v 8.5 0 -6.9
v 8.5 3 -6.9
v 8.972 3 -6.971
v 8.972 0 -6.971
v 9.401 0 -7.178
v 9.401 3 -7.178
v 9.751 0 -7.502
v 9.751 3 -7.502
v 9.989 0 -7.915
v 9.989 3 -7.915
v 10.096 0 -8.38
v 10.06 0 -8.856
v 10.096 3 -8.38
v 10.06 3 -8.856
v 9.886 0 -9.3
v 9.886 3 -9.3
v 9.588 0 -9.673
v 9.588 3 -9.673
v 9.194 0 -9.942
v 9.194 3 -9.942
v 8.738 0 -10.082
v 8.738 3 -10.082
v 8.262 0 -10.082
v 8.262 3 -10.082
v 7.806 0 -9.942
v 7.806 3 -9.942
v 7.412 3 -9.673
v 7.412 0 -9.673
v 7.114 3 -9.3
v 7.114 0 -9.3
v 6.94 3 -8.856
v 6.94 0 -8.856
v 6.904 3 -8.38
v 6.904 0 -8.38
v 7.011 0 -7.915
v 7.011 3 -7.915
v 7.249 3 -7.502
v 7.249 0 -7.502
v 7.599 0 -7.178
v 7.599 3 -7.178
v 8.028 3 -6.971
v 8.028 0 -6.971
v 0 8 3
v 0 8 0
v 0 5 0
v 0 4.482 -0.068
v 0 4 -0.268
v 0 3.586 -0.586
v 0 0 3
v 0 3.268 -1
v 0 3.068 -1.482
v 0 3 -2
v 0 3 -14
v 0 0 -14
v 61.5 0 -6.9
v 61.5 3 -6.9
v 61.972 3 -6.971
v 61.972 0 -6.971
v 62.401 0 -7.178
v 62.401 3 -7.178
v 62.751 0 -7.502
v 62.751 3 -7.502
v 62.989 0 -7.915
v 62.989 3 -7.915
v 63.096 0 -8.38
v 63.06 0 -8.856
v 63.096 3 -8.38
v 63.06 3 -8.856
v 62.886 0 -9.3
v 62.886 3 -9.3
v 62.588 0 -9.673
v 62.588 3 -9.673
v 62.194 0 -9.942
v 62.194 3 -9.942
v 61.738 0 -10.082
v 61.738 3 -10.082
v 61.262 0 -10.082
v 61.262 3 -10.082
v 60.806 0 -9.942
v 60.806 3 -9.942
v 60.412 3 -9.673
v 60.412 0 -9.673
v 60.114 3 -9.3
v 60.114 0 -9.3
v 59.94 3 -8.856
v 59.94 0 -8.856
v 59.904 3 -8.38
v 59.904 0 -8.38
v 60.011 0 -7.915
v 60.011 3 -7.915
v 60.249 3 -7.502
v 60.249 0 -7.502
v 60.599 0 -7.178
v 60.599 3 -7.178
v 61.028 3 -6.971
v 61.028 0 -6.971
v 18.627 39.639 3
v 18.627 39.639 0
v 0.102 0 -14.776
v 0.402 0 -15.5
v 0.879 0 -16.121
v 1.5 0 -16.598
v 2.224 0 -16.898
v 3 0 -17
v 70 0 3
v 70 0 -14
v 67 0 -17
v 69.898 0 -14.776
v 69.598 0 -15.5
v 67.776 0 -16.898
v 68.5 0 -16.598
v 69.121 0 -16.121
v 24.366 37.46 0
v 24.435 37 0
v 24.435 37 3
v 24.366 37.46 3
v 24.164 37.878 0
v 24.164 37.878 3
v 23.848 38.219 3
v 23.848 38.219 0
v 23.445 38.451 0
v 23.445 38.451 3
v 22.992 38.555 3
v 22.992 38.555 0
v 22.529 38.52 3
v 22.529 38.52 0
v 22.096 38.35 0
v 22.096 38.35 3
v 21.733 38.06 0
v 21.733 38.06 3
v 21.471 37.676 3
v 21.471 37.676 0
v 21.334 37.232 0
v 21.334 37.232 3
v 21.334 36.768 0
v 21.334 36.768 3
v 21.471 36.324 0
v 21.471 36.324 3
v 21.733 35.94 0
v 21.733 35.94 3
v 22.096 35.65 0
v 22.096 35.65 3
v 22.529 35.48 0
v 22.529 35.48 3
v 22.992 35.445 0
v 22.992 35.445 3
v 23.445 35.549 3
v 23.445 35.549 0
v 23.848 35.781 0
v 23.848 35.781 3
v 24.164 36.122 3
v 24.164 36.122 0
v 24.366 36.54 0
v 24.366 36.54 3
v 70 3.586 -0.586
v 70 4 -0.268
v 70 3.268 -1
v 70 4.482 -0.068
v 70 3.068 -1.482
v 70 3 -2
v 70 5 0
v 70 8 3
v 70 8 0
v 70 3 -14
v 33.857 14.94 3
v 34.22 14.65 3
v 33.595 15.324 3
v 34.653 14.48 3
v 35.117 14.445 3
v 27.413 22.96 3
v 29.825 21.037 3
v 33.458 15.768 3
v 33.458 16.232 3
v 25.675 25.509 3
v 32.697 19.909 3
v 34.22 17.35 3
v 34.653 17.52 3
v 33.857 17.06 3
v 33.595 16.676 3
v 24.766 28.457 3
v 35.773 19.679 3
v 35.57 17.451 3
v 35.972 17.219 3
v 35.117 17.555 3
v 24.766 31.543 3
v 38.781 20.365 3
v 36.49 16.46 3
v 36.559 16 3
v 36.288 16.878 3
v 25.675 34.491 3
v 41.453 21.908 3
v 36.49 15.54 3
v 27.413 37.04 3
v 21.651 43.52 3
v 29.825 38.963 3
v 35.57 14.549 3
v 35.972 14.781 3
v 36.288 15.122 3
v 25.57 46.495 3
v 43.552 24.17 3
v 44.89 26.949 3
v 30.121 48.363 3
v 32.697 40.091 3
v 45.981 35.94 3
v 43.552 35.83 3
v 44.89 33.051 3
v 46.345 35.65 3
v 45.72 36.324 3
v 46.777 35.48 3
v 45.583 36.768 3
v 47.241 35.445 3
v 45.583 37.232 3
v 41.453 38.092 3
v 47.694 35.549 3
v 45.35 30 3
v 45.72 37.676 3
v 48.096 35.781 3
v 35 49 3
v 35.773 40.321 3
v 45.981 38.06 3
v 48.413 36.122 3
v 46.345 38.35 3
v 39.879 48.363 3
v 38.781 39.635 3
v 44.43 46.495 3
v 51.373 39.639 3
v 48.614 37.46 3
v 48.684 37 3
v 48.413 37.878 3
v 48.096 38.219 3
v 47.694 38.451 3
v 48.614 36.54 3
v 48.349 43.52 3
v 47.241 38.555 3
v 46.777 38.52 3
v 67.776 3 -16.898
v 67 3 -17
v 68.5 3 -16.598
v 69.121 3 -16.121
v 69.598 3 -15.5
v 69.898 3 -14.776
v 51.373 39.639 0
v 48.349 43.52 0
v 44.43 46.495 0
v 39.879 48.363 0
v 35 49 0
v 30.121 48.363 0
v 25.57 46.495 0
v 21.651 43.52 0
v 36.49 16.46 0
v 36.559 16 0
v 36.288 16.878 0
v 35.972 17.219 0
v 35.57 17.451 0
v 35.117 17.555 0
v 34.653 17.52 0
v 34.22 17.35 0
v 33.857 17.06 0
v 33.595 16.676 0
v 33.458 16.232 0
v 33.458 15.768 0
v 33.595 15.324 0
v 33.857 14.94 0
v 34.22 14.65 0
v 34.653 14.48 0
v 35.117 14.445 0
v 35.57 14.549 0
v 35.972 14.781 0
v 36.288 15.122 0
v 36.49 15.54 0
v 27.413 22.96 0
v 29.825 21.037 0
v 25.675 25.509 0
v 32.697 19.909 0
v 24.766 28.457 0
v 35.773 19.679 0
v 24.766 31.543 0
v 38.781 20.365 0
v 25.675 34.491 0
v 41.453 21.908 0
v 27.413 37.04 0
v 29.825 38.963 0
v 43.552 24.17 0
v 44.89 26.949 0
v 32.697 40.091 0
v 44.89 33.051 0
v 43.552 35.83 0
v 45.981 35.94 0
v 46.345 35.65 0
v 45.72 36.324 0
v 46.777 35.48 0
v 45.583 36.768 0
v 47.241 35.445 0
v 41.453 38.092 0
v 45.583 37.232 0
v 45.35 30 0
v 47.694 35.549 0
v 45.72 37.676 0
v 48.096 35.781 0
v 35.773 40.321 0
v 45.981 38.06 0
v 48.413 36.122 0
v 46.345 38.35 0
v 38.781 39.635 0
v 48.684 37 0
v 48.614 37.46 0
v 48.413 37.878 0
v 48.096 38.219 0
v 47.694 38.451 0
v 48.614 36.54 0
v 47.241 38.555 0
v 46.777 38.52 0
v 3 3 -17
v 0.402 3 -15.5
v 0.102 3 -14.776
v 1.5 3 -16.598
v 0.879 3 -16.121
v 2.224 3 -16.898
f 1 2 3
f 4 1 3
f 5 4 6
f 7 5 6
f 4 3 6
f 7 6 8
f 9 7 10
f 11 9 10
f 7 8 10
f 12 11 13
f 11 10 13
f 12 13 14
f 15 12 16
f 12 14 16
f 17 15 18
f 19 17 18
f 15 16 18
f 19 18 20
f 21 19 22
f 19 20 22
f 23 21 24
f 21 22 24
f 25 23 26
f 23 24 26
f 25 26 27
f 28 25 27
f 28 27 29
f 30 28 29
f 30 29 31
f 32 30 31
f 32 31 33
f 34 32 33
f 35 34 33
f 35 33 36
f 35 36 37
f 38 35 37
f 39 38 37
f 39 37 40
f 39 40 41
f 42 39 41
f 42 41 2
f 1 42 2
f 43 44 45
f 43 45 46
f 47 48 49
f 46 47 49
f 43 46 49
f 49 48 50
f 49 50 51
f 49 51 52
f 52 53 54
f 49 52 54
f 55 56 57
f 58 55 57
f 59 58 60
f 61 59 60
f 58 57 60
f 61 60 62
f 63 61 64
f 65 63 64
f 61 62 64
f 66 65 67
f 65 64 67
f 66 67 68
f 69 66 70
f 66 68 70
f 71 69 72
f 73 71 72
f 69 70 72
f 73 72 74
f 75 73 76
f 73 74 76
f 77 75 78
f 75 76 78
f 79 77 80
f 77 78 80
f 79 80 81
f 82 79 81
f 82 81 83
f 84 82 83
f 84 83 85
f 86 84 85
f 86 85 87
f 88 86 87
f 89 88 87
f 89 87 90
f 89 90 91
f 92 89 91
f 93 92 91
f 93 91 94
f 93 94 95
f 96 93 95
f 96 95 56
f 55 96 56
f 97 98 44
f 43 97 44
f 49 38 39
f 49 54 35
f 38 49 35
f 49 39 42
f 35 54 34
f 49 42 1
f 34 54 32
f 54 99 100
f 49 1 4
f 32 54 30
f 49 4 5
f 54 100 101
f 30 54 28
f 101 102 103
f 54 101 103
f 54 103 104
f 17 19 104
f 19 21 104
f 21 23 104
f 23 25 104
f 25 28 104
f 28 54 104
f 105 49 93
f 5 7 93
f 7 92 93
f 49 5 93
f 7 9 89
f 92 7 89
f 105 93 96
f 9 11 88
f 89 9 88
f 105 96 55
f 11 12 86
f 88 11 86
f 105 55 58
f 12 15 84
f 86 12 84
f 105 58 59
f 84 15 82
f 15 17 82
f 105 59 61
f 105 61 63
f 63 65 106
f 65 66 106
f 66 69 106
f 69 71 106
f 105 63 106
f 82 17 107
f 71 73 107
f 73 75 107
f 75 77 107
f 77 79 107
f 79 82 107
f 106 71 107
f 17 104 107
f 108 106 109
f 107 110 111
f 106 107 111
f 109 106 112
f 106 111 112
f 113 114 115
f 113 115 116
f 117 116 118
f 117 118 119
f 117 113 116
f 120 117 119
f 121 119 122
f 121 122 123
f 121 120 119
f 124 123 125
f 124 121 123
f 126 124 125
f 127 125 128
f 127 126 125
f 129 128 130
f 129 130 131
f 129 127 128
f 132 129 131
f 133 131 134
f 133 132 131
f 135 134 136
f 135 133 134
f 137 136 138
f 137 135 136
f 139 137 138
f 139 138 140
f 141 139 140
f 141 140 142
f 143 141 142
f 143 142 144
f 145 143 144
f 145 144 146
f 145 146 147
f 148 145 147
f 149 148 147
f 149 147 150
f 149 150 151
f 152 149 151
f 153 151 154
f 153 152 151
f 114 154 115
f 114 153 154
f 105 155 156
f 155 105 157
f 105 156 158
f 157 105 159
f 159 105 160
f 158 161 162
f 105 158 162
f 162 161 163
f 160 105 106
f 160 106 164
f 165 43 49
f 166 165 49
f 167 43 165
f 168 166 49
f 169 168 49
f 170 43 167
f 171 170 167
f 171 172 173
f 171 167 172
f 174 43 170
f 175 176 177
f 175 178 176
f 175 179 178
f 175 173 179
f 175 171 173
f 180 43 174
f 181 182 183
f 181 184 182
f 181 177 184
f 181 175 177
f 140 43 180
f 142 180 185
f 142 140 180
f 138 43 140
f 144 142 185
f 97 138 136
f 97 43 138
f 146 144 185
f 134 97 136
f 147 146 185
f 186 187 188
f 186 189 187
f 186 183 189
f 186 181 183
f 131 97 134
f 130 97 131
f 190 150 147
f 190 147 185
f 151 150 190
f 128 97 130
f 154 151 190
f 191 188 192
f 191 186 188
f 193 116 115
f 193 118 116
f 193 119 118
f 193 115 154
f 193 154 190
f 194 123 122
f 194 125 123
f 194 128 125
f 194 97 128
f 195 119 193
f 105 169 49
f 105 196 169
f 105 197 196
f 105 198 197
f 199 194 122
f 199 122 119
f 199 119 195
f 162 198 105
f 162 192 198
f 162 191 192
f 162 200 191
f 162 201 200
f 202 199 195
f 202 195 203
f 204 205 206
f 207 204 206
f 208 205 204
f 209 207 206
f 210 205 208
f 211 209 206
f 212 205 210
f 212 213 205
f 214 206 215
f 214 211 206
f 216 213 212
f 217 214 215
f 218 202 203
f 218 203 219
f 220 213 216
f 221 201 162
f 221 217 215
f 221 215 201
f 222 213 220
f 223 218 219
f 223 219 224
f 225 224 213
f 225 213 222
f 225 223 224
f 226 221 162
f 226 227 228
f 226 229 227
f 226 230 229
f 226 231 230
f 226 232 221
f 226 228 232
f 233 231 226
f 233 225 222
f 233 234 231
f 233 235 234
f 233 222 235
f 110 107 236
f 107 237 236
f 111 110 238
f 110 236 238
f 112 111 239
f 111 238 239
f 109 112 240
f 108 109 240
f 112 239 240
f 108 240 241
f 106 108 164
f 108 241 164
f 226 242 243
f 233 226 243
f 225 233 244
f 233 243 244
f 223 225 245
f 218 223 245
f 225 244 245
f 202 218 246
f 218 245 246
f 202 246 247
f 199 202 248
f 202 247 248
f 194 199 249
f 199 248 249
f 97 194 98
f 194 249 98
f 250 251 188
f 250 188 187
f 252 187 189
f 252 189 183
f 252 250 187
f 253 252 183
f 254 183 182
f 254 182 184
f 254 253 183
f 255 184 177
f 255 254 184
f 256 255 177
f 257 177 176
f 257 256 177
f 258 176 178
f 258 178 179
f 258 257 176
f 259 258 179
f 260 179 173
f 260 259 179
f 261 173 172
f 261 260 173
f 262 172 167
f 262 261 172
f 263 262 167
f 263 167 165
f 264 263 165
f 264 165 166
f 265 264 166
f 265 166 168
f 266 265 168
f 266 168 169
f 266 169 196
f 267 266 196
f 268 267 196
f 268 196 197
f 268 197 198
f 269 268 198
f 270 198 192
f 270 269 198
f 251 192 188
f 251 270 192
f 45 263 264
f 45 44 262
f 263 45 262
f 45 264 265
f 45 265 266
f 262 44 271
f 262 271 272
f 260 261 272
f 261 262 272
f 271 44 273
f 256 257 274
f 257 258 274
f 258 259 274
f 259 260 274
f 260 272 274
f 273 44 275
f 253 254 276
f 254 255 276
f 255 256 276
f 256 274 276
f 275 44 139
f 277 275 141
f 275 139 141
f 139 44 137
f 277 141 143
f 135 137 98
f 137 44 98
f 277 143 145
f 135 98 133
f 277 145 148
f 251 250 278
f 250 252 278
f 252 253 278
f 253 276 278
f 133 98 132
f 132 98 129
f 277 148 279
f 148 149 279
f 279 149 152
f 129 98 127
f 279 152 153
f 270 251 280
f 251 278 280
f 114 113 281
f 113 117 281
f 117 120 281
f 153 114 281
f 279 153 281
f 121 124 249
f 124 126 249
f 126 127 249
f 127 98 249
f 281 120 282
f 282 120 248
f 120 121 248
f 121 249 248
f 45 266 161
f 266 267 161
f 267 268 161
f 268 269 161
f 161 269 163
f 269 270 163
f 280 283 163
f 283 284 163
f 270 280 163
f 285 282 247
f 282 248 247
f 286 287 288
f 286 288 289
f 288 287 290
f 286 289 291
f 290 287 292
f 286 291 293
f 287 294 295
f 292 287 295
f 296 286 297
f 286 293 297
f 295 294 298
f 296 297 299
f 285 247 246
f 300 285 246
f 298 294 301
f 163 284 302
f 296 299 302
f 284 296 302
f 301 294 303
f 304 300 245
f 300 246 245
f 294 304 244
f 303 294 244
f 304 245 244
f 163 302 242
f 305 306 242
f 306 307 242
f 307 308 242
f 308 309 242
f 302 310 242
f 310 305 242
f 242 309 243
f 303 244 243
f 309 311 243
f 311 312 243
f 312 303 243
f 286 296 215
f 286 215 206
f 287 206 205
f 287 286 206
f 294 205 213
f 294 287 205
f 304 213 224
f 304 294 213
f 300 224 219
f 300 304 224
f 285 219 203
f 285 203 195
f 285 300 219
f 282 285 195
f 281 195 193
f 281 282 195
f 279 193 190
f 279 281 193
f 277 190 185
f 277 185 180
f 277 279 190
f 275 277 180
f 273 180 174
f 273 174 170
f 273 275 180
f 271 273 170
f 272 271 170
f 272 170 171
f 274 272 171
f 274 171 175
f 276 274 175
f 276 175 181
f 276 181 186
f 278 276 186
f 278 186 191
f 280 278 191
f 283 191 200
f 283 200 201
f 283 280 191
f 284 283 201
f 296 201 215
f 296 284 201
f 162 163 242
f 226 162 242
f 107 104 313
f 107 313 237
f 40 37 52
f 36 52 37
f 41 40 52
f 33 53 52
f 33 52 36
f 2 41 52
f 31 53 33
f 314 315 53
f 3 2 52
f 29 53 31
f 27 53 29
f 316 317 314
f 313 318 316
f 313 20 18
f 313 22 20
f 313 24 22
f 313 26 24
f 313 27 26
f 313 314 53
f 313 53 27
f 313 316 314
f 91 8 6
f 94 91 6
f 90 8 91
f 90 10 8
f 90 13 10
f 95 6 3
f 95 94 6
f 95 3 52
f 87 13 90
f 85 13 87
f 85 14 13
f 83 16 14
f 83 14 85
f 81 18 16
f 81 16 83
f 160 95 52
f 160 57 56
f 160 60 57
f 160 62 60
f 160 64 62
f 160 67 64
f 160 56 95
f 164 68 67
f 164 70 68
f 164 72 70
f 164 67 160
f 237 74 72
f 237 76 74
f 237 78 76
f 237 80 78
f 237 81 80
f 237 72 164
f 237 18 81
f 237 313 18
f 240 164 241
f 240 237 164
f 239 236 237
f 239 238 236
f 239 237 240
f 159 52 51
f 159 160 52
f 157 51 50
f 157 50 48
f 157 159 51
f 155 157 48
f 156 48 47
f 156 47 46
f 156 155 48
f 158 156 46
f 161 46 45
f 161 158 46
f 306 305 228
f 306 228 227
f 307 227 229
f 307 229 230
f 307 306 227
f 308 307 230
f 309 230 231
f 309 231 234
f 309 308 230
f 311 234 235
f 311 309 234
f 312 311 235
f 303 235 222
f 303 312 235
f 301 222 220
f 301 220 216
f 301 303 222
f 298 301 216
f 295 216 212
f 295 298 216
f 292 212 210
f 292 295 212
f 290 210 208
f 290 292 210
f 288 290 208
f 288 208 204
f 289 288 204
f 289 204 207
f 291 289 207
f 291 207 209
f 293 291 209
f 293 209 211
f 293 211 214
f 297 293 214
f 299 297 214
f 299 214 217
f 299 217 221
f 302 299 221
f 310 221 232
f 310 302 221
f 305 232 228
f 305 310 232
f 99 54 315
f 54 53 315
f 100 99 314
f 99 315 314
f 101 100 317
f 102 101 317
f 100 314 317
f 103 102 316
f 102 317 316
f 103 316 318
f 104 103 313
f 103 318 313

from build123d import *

# Parameters (mm, degrees)
SKETCH1_W           = 70
SKETCH1_H           = 17
BOSS_EXTRUDE1_DEPTH = 3
SKETCH2_R           = 10.35
SKETCH2_R_2         = 1.559144978
BOSS_EXTRUDE2_DEPTH = 3
SKETCH3_R           = 1.6
CUT_EXTRUDE1_DEPTH  = 4
FILLET1_R           = 3
FILLET2_R           = 2


with BuildPart() as part:
    # Sketch1 → Boss-Extrude1 (new body)
    with BuildSketch(Plane(origin=(0, 0, 0), x_dir=(1, 0, 0), z_dir=(0, 1, 0))):
        with Locations((35, 8.5)):
            Rectangle(SKETCH1_W, SKETCH1_H)
    extrude(amount=BOSS_EXTRUDE1_DEPTH)

    # Sketch2 → Boss-Extrude2 (add)
    with BuildSketch(Plane.XY):
        with BuildLine():
            Line((0, 0), (70, 0))
            Line((70, 0), (70, 8))
            Line((70, 8), (51.37327089, 39.639294598))
            ThreePointArc((51.37327089, 39.639294598), (35, 49), (18.62672911, 39.639294598))
            Line((18.62672911, 39.639294598), (0, 8))
            Line((0, 8), (0, 0))
        make_face()
        with Locations((35, 30)):
            Circle(SKETCH2_R, mode=Mode.SUBTRACT)
        with Locations((35, 16)):
            Circle(SKETCH2_R_2, mode=Mode.SUBTRACT)
        with Locations((22.875644347, 37)):
            Circle(SKETCH2_R_2, mode=Mode.SUBTRACT)
        with Locations((47.124355653, 37)):
            Circle(SKETCH2_R_2, mode=Mode.SUBTRACT)
    extrude(amount=BOSS_EXTRUDE2_DEPTH)

    # Sketch3 → Cut-Extrude1 (cut, through all)
    with BuildSketch(Plane(origin=(0, 3, 0), x_dir=(1, 0, 0), z_dir=(0, 1, 0))):
        with Locations(Location((8.5, 8.5, 0), (0, 0, 270))):  # turned: the seam where the file's is
            Circle(SKETCH3_R)
        with Locations(Location((61.5, 8.5, 0), (0, 0, 270))):  # turned: the seam where the file's is
            Circle(SKETCH3_R)
    extrude(amount=-CUT_EXTRUDE1_DEPTH, mode=Mode.SUBTRACT)

    # Fillet1
    fillet1_edges = [part.edges().sort_by_distance(p)[0] for p in [
        (70, 1.5, -17),
        (0, 1.5, -17),
    ]]
    fillet(fillet1_edges, radius=FILLET1_R)

    # Fillet2
    fillet2_edges = [part.edges().sort_by_distance(p)[0] for p in [
        (35, 3, 0),
    ]]
    fillet(fillet2_edges, radius=FILLET2_R)


solid = part.part
